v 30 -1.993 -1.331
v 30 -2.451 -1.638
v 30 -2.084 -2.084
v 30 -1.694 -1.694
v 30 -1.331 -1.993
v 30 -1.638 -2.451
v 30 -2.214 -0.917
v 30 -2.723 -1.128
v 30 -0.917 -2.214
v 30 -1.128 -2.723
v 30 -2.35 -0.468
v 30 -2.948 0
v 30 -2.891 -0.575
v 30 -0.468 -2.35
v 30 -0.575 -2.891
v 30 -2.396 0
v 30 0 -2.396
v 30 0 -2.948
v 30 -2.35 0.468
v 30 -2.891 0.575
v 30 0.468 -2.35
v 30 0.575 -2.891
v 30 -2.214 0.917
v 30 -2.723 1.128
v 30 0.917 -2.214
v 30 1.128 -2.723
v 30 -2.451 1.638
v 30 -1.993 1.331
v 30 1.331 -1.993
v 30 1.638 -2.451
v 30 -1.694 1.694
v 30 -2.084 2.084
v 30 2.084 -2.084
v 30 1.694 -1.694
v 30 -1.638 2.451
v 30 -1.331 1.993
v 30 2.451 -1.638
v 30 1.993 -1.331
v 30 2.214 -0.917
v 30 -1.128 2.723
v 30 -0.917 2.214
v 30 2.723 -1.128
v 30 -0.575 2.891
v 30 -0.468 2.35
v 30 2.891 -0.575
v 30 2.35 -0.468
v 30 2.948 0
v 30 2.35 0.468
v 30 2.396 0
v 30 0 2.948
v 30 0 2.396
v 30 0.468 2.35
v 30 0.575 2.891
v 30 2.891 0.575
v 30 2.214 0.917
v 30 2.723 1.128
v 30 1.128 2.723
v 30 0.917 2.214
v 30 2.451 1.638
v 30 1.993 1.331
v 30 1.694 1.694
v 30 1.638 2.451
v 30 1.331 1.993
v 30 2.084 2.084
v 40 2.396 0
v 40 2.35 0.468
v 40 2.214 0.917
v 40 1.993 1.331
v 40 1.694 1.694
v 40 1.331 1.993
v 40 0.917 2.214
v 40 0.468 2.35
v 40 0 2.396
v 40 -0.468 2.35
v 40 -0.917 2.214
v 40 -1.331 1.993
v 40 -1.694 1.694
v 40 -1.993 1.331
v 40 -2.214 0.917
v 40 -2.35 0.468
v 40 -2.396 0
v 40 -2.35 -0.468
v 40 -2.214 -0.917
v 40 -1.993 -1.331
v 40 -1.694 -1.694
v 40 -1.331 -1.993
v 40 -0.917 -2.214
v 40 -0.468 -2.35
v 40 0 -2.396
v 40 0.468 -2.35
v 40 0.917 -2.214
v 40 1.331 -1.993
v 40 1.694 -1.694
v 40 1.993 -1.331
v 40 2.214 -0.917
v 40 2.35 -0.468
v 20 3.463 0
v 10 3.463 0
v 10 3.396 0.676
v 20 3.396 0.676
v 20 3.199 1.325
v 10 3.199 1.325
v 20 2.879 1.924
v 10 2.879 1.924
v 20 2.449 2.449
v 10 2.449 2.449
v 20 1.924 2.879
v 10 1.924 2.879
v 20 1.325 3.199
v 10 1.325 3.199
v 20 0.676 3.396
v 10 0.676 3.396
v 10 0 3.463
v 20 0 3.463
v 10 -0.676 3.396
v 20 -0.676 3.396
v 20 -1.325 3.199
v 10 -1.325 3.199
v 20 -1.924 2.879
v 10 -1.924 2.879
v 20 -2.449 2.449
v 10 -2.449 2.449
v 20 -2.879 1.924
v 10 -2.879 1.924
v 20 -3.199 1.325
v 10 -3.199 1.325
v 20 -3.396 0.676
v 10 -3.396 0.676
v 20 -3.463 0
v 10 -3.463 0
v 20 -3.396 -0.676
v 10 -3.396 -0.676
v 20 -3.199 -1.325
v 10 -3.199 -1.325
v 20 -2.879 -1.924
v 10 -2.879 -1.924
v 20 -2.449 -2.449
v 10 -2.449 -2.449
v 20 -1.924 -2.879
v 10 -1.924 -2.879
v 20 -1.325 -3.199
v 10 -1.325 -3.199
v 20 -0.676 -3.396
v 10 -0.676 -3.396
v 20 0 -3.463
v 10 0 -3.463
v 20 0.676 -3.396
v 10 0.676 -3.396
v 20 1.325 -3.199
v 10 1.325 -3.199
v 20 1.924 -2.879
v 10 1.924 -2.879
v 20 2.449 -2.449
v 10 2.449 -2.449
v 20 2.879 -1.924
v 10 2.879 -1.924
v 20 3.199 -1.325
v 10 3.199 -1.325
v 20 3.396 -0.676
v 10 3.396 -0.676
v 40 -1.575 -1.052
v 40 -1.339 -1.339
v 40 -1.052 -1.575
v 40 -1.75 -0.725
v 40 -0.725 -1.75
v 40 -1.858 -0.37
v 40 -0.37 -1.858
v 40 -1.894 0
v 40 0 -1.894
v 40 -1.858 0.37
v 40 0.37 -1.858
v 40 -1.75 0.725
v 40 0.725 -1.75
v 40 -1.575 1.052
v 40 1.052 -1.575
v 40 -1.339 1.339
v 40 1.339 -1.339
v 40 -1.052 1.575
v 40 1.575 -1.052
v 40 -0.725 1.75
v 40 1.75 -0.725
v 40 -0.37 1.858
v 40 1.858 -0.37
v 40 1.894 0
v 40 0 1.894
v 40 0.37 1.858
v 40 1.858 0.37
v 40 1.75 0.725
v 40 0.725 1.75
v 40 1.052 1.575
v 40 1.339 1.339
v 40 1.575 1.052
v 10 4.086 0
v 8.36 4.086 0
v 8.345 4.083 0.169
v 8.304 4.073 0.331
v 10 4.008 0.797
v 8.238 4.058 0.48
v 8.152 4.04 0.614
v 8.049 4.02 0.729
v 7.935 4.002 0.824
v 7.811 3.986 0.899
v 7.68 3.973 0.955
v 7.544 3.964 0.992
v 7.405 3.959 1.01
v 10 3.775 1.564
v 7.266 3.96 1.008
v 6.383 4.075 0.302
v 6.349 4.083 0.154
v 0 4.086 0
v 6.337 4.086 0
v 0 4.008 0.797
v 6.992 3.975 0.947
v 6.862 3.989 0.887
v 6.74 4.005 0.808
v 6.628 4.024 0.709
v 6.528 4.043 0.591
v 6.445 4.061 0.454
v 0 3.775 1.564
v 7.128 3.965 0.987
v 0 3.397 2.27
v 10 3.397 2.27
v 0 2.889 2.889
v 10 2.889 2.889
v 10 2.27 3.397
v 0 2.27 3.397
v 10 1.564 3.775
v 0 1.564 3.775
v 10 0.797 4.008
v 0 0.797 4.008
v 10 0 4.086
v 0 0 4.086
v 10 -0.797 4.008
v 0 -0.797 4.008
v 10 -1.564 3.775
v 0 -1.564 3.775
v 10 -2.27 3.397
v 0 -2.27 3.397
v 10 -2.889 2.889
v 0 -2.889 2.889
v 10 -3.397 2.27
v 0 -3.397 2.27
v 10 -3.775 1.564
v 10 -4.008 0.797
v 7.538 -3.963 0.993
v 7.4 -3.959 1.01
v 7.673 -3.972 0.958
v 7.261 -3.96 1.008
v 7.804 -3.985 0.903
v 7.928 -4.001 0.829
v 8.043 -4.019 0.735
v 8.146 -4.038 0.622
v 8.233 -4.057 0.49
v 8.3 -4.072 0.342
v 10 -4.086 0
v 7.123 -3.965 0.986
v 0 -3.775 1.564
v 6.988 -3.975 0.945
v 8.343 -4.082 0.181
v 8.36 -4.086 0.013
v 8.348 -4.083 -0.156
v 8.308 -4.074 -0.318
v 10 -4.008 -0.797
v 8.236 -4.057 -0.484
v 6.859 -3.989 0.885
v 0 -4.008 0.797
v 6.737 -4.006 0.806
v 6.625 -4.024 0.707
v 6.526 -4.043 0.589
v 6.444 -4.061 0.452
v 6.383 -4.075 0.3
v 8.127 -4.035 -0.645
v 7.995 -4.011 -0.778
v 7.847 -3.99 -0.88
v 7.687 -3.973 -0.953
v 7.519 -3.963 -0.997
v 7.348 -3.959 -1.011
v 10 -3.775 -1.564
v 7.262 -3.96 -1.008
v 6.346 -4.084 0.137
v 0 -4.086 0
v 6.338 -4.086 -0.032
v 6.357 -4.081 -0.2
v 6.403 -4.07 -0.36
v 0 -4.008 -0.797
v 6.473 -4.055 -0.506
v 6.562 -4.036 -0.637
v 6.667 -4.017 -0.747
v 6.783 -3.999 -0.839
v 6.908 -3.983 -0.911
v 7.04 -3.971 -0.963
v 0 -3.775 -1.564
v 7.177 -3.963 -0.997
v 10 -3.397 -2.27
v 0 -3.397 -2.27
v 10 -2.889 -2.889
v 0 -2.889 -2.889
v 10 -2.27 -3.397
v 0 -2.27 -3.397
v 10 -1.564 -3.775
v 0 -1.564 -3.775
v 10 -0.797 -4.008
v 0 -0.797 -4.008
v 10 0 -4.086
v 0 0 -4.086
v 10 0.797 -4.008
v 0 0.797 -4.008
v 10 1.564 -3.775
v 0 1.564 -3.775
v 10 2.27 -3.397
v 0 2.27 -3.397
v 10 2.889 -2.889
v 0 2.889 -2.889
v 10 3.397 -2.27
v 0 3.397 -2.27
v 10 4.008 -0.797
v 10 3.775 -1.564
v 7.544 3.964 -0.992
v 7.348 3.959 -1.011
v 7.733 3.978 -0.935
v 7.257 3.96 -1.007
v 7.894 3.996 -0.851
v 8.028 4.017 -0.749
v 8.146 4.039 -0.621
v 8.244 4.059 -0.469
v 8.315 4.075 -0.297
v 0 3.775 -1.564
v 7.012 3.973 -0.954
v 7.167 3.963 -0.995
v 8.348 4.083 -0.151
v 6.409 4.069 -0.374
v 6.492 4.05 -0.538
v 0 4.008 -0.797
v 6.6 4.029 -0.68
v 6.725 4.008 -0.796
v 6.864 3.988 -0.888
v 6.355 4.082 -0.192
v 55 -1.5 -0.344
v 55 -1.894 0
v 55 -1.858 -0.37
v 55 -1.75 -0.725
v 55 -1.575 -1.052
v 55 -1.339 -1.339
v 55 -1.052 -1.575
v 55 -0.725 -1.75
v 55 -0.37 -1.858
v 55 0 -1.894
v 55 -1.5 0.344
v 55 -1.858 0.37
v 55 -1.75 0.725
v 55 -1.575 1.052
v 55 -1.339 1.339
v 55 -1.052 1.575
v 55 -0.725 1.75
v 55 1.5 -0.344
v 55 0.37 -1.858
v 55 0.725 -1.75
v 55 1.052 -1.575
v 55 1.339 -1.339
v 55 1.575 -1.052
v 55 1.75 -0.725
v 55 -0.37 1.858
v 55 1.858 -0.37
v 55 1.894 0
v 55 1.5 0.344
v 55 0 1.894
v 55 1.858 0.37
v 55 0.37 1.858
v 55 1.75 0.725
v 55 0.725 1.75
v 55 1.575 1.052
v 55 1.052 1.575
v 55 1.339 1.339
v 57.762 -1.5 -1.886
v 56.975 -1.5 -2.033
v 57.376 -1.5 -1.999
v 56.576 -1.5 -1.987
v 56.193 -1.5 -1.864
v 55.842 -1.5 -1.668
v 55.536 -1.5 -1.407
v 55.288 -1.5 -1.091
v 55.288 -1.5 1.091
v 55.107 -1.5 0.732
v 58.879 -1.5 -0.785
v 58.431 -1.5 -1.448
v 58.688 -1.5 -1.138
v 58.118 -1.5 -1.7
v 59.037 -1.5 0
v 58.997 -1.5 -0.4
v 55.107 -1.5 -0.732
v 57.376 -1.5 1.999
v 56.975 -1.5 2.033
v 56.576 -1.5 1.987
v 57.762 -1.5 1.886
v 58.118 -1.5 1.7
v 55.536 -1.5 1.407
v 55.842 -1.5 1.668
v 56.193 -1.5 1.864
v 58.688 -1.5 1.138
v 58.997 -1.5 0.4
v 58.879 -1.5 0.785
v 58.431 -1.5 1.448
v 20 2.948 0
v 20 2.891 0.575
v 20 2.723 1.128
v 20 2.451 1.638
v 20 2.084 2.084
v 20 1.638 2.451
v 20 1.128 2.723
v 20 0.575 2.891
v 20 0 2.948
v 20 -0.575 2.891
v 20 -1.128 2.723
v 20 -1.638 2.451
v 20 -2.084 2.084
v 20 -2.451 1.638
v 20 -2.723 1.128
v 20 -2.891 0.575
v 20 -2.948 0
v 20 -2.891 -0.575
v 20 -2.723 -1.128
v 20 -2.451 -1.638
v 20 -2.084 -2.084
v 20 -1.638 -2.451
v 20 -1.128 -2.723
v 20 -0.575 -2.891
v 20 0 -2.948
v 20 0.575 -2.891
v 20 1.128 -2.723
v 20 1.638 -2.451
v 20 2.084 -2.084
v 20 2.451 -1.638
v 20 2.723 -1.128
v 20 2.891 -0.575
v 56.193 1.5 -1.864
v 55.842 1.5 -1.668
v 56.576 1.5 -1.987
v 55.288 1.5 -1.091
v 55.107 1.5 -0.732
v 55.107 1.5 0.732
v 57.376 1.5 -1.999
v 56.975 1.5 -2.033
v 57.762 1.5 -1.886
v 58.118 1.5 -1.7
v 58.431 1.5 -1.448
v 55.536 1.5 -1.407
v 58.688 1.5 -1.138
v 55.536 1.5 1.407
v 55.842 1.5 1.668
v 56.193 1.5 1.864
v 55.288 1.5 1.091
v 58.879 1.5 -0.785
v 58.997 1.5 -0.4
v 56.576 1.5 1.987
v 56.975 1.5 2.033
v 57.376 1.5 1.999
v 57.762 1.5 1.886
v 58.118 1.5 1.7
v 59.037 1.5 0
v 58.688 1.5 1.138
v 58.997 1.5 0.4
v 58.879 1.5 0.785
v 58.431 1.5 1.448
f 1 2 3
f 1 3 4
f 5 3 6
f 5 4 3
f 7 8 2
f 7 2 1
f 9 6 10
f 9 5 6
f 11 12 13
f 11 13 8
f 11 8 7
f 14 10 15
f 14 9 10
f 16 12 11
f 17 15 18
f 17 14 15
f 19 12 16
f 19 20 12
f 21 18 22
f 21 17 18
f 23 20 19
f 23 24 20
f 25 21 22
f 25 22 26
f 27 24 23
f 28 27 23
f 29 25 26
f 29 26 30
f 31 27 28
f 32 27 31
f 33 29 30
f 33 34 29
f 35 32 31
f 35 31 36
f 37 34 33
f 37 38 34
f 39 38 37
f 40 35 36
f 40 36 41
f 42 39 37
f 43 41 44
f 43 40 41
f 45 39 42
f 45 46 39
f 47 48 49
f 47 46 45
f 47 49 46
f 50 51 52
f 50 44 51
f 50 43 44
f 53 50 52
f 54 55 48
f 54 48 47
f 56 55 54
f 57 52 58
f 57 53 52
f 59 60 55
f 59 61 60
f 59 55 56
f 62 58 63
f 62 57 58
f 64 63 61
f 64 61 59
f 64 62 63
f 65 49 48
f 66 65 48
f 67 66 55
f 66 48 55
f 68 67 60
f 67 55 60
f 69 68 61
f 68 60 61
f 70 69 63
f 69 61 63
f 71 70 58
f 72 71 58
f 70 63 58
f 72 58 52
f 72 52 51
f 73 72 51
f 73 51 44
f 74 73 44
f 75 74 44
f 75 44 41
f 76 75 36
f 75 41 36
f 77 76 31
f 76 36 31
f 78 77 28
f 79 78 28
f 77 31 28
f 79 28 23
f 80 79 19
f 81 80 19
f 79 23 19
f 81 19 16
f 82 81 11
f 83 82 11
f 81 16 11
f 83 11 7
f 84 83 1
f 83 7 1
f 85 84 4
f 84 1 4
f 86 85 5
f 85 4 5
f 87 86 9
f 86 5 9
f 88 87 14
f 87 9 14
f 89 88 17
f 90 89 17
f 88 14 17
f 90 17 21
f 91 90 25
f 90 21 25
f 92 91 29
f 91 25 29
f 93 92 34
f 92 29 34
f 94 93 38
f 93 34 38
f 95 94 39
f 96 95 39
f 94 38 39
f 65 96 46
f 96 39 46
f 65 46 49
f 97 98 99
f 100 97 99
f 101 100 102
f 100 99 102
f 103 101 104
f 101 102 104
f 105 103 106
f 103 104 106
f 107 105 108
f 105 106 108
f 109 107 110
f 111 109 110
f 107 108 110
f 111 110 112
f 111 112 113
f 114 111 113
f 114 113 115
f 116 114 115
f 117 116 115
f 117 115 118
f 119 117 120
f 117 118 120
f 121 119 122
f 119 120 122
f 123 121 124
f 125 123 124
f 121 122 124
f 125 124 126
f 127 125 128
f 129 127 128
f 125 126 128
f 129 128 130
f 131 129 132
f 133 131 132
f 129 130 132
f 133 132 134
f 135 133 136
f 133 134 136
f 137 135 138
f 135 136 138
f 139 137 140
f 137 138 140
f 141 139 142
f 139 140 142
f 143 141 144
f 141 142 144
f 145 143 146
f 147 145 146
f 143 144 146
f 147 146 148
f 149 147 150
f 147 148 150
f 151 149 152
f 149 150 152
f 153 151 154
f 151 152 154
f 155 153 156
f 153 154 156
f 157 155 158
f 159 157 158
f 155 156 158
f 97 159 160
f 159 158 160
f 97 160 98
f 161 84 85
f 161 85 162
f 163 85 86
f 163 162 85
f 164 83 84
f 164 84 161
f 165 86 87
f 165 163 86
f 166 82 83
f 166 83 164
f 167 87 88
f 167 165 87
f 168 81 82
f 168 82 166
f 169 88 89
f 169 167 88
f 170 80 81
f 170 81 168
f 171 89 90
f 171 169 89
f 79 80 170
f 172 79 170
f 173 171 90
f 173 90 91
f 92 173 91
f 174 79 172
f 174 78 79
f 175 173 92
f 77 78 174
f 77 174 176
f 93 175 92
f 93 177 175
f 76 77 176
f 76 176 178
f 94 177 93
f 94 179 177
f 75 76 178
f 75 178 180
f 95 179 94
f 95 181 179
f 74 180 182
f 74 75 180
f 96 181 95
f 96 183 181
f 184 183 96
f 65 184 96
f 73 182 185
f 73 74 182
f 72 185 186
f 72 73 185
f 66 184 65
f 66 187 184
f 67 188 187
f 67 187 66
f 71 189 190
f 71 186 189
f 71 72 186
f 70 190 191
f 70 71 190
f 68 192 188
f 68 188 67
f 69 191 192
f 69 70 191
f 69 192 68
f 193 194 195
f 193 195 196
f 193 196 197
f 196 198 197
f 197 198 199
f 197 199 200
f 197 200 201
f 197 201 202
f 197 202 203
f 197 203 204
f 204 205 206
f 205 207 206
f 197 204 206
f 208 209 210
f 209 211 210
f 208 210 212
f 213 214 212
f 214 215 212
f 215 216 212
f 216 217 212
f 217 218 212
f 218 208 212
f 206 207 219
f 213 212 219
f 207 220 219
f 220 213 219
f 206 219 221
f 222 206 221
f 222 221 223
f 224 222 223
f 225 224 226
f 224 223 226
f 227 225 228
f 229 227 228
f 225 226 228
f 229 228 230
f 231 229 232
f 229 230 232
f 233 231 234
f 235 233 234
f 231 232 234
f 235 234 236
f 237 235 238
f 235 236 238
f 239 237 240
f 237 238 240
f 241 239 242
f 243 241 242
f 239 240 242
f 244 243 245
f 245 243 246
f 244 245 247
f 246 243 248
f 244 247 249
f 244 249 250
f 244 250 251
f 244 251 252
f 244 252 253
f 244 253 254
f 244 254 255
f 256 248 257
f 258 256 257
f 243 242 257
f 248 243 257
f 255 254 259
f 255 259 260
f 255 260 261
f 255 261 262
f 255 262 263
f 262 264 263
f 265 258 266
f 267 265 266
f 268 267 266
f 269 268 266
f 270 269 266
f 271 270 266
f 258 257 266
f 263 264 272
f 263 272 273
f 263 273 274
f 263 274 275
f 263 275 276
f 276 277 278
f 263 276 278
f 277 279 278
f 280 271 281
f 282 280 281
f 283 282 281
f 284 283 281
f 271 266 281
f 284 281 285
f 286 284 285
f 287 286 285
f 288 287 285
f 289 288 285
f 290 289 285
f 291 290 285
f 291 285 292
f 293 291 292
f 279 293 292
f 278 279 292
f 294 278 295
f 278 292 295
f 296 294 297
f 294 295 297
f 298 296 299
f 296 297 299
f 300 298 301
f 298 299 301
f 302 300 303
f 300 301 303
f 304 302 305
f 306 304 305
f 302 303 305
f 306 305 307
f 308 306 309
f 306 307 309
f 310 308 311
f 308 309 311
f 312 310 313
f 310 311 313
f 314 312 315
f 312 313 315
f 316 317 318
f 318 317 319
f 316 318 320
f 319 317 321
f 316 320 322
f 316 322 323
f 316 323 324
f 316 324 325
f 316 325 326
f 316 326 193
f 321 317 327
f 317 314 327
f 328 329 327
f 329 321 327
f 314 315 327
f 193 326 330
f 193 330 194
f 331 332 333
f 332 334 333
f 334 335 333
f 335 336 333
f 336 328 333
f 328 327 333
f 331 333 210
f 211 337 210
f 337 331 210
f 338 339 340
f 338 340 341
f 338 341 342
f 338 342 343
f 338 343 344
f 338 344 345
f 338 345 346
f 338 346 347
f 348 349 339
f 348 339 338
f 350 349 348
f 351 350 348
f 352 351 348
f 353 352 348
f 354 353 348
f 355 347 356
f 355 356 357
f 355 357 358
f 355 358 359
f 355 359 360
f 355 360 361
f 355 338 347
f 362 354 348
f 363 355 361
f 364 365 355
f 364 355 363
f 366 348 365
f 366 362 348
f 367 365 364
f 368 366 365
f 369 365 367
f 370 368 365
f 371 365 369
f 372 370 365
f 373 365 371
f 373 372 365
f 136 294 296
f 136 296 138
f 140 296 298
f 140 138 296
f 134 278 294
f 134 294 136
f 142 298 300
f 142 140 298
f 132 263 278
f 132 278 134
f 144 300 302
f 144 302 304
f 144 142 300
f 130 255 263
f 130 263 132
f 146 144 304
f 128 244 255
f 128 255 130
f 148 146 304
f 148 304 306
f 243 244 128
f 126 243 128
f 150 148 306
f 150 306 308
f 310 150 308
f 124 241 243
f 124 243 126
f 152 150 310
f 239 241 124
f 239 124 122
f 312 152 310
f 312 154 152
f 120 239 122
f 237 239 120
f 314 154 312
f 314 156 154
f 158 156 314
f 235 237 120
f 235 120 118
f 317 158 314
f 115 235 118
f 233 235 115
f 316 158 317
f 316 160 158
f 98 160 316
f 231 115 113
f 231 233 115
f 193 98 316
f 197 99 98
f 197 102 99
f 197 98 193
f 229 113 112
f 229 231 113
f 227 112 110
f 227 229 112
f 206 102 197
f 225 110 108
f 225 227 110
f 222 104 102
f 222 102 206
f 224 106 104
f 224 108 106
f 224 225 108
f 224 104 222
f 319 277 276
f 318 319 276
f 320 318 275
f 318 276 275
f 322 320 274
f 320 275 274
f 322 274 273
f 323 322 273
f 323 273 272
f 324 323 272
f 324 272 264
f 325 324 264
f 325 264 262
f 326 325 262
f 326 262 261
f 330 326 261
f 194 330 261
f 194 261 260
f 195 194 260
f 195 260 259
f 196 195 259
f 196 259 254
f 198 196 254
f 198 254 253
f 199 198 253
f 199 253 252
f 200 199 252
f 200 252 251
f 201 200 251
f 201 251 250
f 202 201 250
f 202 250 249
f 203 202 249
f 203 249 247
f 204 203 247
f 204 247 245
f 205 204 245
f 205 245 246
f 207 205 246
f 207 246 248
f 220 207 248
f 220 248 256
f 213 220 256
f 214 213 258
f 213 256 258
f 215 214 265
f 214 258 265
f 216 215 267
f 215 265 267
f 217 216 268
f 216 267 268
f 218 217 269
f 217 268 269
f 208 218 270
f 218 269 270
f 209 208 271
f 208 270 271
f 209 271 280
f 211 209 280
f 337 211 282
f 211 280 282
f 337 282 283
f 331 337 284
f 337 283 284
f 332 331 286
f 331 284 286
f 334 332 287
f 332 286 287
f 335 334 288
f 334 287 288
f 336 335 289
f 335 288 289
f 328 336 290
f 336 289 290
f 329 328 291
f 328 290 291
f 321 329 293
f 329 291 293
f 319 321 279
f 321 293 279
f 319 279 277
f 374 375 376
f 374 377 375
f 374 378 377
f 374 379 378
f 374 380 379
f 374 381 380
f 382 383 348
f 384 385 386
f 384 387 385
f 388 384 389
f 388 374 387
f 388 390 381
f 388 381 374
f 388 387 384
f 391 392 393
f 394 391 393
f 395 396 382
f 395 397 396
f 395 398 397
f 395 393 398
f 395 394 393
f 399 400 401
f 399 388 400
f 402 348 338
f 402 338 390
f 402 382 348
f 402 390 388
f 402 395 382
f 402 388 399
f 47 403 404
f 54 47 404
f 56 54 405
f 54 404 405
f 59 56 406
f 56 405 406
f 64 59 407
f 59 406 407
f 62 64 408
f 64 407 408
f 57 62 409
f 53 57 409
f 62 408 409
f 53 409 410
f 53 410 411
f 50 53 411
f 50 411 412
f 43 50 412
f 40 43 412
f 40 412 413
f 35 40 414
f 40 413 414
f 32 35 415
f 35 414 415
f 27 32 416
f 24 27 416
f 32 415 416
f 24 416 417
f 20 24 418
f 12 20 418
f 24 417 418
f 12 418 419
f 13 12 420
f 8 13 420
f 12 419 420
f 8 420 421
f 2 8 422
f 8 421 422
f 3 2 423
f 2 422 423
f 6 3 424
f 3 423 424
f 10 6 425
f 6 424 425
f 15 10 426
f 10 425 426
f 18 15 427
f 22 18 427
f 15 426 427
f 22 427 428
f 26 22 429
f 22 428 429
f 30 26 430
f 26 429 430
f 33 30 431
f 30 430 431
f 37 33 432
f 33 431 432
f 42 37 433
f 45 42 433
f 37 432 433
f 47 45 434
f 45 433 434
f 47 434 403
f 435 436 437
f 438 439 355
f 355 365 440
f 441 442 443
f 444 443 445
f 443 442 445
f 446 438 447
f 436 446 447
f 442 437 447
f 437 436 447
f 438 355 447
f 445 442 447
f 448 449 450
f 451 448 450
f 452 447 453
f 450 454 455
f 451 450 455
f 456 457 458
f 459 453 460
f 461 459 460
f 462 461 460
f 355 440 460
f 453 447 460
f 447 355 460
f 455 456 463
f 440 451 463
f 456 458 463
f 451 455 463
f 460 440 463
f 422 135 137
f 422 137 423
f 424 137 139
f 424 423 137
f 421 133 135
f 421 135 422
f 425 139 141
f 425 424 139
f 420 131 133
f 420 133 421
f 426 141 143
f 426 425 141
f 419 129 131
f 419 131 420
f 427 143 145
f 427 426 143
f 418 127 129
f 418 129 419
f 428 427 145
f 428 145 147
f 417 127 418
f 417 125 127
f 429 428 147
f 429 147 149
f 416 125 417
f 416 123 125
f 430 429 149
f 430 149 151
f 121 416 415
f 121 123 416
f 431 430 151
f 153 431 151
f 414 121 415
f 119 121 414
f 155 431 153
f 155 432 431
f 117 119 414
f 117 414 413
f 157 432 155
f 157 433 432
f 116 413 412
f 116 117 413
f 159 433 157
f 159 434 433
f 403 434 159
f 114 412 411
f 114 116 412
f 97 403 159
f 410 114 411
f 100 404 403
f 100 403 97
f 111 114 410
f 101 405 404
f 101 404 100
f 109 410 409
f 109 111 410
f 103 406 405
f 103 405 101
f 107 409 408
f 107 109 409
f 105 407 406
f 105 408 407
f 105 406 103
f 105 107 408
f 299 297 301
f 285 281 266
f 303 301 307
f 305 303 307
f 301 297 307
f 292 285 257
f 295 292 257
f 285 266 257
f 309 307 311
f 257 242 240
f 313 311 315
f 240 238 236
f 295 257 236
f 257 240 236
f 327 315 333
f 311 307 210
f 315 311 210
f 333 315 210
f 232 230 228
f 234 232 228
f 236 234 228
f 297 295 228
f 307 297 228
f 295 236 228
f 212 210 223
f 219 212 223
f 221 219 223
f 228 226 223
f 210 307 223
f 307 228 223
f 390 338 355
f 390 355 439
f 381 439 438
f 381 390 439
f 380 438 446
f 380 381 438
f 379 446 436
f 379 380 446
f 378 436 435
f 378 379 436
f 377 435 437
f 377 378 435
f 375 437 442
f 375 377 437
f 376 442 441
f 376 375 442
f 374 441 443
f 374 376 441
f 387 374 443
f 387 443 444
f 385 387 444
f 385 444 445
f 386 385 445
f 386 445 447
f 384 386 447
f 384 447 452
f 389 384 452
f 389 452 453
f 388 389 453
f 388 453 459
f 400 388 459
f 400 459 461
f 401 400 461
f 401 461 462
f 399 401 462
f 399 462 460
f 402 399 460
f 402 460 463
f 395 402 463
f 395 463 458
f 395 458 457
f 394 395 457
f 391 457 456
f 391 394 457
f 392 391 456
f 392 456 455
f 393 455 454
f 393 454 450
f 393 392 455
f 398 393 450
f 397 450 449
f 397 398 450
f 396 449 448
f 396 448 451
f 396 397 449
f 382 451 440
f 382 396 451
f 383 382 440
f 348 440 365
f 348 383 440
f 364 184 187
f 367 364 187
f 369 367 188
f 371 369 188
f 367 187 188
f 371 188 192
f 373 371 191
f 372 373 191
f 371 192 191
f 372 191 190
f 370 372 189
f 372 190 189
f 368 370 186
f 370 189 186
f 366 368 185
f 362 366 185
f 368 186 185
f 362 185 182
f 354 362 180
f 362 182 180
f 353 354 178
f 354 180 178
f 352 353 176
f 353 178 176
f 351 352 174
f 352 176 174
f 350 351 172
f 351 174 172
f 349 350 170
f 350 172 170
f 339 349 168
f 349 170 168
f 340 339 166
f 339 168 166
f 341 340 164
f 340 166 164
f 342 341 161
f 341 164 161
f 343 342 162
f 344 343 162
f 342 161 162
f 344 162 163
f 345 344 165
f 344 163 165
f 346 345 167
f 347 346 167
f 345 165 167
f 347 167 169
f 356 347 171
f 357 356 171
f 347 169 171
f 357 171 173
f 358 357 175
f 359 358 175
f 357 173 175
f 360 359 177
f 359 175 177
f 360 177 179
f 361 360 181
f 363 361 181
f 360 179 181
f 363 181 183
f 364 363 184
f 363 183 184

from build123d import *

# Parameters (mm, degrees)
F0_R      = 4.086054
F1_DEPTH  = 10
F2_R      = 3.46296
F3_DEPTH  = 10
F4_R      = 2.947818
F5_DEPTH  = 10
F6_R      = 2.396376
F7_DEPTH  = 10
F8_R      = 1.894125
F9_DEPTH  = 15
F10_R     = 2.032934
F11_DEPTH = 1.5
F13_DEPTH = 12.5


with BuildPart() as f1:
    # F0 (on Right) → F1 (new body)
    with BuildSketch(Plane.YZ):
        Circle(F0_R)
    extrude(amount=F1_DEPTH)

    # F2 (on face) → F3 (join)
    with BuildSketch(Plane.YZ.offset(10)):
        Circle(F2_R)
    extrude(amount=F3_DEPTH)

    # F4 (on face) → F5 (join)
    with BuildSketch(Plane.YZ.offset(20)):
        Circle(F4_R)
    extrude(amount=F5_DEPTH)

    # F6 (on face) → F7 (join)
    with BuildSketch(Plane.YZ.offset(30)):
        Circle(F6_R)
    extrude(amount=F7_DEPTH)

    # F8 (on face) → F9 (join)
    with BuildSketch(Plane.YZ.offset(40)):
        Circle(F8_R)
    extrude(amount=F9_DEPTH)

    # F10 (on Front) → F11 (join, symmetric)
    with BuildSketch(Plane.XZ):
        with Locations((57.003621, 0)):
            Circle(F10_R)
    extrude(amount=F11_DEPTH, both=True)

    # F12 (on Front) → F13 (cut, symmetric)
    with BuildSketch(Plane.XZ):
        with BuildLine():
            ThreePointArc((7.348375, 1.011325), (6.33705, 0), (7.348375, -1.011325))
            ThreePointArc((7.348375, -1.011325), (8.3597, 0), (7.348375, 1.011325))
        make_face()
    extrude(amount=F13_DEPTH, both=True, mode=Mode.SUBTRACT)


solid = f1.part
